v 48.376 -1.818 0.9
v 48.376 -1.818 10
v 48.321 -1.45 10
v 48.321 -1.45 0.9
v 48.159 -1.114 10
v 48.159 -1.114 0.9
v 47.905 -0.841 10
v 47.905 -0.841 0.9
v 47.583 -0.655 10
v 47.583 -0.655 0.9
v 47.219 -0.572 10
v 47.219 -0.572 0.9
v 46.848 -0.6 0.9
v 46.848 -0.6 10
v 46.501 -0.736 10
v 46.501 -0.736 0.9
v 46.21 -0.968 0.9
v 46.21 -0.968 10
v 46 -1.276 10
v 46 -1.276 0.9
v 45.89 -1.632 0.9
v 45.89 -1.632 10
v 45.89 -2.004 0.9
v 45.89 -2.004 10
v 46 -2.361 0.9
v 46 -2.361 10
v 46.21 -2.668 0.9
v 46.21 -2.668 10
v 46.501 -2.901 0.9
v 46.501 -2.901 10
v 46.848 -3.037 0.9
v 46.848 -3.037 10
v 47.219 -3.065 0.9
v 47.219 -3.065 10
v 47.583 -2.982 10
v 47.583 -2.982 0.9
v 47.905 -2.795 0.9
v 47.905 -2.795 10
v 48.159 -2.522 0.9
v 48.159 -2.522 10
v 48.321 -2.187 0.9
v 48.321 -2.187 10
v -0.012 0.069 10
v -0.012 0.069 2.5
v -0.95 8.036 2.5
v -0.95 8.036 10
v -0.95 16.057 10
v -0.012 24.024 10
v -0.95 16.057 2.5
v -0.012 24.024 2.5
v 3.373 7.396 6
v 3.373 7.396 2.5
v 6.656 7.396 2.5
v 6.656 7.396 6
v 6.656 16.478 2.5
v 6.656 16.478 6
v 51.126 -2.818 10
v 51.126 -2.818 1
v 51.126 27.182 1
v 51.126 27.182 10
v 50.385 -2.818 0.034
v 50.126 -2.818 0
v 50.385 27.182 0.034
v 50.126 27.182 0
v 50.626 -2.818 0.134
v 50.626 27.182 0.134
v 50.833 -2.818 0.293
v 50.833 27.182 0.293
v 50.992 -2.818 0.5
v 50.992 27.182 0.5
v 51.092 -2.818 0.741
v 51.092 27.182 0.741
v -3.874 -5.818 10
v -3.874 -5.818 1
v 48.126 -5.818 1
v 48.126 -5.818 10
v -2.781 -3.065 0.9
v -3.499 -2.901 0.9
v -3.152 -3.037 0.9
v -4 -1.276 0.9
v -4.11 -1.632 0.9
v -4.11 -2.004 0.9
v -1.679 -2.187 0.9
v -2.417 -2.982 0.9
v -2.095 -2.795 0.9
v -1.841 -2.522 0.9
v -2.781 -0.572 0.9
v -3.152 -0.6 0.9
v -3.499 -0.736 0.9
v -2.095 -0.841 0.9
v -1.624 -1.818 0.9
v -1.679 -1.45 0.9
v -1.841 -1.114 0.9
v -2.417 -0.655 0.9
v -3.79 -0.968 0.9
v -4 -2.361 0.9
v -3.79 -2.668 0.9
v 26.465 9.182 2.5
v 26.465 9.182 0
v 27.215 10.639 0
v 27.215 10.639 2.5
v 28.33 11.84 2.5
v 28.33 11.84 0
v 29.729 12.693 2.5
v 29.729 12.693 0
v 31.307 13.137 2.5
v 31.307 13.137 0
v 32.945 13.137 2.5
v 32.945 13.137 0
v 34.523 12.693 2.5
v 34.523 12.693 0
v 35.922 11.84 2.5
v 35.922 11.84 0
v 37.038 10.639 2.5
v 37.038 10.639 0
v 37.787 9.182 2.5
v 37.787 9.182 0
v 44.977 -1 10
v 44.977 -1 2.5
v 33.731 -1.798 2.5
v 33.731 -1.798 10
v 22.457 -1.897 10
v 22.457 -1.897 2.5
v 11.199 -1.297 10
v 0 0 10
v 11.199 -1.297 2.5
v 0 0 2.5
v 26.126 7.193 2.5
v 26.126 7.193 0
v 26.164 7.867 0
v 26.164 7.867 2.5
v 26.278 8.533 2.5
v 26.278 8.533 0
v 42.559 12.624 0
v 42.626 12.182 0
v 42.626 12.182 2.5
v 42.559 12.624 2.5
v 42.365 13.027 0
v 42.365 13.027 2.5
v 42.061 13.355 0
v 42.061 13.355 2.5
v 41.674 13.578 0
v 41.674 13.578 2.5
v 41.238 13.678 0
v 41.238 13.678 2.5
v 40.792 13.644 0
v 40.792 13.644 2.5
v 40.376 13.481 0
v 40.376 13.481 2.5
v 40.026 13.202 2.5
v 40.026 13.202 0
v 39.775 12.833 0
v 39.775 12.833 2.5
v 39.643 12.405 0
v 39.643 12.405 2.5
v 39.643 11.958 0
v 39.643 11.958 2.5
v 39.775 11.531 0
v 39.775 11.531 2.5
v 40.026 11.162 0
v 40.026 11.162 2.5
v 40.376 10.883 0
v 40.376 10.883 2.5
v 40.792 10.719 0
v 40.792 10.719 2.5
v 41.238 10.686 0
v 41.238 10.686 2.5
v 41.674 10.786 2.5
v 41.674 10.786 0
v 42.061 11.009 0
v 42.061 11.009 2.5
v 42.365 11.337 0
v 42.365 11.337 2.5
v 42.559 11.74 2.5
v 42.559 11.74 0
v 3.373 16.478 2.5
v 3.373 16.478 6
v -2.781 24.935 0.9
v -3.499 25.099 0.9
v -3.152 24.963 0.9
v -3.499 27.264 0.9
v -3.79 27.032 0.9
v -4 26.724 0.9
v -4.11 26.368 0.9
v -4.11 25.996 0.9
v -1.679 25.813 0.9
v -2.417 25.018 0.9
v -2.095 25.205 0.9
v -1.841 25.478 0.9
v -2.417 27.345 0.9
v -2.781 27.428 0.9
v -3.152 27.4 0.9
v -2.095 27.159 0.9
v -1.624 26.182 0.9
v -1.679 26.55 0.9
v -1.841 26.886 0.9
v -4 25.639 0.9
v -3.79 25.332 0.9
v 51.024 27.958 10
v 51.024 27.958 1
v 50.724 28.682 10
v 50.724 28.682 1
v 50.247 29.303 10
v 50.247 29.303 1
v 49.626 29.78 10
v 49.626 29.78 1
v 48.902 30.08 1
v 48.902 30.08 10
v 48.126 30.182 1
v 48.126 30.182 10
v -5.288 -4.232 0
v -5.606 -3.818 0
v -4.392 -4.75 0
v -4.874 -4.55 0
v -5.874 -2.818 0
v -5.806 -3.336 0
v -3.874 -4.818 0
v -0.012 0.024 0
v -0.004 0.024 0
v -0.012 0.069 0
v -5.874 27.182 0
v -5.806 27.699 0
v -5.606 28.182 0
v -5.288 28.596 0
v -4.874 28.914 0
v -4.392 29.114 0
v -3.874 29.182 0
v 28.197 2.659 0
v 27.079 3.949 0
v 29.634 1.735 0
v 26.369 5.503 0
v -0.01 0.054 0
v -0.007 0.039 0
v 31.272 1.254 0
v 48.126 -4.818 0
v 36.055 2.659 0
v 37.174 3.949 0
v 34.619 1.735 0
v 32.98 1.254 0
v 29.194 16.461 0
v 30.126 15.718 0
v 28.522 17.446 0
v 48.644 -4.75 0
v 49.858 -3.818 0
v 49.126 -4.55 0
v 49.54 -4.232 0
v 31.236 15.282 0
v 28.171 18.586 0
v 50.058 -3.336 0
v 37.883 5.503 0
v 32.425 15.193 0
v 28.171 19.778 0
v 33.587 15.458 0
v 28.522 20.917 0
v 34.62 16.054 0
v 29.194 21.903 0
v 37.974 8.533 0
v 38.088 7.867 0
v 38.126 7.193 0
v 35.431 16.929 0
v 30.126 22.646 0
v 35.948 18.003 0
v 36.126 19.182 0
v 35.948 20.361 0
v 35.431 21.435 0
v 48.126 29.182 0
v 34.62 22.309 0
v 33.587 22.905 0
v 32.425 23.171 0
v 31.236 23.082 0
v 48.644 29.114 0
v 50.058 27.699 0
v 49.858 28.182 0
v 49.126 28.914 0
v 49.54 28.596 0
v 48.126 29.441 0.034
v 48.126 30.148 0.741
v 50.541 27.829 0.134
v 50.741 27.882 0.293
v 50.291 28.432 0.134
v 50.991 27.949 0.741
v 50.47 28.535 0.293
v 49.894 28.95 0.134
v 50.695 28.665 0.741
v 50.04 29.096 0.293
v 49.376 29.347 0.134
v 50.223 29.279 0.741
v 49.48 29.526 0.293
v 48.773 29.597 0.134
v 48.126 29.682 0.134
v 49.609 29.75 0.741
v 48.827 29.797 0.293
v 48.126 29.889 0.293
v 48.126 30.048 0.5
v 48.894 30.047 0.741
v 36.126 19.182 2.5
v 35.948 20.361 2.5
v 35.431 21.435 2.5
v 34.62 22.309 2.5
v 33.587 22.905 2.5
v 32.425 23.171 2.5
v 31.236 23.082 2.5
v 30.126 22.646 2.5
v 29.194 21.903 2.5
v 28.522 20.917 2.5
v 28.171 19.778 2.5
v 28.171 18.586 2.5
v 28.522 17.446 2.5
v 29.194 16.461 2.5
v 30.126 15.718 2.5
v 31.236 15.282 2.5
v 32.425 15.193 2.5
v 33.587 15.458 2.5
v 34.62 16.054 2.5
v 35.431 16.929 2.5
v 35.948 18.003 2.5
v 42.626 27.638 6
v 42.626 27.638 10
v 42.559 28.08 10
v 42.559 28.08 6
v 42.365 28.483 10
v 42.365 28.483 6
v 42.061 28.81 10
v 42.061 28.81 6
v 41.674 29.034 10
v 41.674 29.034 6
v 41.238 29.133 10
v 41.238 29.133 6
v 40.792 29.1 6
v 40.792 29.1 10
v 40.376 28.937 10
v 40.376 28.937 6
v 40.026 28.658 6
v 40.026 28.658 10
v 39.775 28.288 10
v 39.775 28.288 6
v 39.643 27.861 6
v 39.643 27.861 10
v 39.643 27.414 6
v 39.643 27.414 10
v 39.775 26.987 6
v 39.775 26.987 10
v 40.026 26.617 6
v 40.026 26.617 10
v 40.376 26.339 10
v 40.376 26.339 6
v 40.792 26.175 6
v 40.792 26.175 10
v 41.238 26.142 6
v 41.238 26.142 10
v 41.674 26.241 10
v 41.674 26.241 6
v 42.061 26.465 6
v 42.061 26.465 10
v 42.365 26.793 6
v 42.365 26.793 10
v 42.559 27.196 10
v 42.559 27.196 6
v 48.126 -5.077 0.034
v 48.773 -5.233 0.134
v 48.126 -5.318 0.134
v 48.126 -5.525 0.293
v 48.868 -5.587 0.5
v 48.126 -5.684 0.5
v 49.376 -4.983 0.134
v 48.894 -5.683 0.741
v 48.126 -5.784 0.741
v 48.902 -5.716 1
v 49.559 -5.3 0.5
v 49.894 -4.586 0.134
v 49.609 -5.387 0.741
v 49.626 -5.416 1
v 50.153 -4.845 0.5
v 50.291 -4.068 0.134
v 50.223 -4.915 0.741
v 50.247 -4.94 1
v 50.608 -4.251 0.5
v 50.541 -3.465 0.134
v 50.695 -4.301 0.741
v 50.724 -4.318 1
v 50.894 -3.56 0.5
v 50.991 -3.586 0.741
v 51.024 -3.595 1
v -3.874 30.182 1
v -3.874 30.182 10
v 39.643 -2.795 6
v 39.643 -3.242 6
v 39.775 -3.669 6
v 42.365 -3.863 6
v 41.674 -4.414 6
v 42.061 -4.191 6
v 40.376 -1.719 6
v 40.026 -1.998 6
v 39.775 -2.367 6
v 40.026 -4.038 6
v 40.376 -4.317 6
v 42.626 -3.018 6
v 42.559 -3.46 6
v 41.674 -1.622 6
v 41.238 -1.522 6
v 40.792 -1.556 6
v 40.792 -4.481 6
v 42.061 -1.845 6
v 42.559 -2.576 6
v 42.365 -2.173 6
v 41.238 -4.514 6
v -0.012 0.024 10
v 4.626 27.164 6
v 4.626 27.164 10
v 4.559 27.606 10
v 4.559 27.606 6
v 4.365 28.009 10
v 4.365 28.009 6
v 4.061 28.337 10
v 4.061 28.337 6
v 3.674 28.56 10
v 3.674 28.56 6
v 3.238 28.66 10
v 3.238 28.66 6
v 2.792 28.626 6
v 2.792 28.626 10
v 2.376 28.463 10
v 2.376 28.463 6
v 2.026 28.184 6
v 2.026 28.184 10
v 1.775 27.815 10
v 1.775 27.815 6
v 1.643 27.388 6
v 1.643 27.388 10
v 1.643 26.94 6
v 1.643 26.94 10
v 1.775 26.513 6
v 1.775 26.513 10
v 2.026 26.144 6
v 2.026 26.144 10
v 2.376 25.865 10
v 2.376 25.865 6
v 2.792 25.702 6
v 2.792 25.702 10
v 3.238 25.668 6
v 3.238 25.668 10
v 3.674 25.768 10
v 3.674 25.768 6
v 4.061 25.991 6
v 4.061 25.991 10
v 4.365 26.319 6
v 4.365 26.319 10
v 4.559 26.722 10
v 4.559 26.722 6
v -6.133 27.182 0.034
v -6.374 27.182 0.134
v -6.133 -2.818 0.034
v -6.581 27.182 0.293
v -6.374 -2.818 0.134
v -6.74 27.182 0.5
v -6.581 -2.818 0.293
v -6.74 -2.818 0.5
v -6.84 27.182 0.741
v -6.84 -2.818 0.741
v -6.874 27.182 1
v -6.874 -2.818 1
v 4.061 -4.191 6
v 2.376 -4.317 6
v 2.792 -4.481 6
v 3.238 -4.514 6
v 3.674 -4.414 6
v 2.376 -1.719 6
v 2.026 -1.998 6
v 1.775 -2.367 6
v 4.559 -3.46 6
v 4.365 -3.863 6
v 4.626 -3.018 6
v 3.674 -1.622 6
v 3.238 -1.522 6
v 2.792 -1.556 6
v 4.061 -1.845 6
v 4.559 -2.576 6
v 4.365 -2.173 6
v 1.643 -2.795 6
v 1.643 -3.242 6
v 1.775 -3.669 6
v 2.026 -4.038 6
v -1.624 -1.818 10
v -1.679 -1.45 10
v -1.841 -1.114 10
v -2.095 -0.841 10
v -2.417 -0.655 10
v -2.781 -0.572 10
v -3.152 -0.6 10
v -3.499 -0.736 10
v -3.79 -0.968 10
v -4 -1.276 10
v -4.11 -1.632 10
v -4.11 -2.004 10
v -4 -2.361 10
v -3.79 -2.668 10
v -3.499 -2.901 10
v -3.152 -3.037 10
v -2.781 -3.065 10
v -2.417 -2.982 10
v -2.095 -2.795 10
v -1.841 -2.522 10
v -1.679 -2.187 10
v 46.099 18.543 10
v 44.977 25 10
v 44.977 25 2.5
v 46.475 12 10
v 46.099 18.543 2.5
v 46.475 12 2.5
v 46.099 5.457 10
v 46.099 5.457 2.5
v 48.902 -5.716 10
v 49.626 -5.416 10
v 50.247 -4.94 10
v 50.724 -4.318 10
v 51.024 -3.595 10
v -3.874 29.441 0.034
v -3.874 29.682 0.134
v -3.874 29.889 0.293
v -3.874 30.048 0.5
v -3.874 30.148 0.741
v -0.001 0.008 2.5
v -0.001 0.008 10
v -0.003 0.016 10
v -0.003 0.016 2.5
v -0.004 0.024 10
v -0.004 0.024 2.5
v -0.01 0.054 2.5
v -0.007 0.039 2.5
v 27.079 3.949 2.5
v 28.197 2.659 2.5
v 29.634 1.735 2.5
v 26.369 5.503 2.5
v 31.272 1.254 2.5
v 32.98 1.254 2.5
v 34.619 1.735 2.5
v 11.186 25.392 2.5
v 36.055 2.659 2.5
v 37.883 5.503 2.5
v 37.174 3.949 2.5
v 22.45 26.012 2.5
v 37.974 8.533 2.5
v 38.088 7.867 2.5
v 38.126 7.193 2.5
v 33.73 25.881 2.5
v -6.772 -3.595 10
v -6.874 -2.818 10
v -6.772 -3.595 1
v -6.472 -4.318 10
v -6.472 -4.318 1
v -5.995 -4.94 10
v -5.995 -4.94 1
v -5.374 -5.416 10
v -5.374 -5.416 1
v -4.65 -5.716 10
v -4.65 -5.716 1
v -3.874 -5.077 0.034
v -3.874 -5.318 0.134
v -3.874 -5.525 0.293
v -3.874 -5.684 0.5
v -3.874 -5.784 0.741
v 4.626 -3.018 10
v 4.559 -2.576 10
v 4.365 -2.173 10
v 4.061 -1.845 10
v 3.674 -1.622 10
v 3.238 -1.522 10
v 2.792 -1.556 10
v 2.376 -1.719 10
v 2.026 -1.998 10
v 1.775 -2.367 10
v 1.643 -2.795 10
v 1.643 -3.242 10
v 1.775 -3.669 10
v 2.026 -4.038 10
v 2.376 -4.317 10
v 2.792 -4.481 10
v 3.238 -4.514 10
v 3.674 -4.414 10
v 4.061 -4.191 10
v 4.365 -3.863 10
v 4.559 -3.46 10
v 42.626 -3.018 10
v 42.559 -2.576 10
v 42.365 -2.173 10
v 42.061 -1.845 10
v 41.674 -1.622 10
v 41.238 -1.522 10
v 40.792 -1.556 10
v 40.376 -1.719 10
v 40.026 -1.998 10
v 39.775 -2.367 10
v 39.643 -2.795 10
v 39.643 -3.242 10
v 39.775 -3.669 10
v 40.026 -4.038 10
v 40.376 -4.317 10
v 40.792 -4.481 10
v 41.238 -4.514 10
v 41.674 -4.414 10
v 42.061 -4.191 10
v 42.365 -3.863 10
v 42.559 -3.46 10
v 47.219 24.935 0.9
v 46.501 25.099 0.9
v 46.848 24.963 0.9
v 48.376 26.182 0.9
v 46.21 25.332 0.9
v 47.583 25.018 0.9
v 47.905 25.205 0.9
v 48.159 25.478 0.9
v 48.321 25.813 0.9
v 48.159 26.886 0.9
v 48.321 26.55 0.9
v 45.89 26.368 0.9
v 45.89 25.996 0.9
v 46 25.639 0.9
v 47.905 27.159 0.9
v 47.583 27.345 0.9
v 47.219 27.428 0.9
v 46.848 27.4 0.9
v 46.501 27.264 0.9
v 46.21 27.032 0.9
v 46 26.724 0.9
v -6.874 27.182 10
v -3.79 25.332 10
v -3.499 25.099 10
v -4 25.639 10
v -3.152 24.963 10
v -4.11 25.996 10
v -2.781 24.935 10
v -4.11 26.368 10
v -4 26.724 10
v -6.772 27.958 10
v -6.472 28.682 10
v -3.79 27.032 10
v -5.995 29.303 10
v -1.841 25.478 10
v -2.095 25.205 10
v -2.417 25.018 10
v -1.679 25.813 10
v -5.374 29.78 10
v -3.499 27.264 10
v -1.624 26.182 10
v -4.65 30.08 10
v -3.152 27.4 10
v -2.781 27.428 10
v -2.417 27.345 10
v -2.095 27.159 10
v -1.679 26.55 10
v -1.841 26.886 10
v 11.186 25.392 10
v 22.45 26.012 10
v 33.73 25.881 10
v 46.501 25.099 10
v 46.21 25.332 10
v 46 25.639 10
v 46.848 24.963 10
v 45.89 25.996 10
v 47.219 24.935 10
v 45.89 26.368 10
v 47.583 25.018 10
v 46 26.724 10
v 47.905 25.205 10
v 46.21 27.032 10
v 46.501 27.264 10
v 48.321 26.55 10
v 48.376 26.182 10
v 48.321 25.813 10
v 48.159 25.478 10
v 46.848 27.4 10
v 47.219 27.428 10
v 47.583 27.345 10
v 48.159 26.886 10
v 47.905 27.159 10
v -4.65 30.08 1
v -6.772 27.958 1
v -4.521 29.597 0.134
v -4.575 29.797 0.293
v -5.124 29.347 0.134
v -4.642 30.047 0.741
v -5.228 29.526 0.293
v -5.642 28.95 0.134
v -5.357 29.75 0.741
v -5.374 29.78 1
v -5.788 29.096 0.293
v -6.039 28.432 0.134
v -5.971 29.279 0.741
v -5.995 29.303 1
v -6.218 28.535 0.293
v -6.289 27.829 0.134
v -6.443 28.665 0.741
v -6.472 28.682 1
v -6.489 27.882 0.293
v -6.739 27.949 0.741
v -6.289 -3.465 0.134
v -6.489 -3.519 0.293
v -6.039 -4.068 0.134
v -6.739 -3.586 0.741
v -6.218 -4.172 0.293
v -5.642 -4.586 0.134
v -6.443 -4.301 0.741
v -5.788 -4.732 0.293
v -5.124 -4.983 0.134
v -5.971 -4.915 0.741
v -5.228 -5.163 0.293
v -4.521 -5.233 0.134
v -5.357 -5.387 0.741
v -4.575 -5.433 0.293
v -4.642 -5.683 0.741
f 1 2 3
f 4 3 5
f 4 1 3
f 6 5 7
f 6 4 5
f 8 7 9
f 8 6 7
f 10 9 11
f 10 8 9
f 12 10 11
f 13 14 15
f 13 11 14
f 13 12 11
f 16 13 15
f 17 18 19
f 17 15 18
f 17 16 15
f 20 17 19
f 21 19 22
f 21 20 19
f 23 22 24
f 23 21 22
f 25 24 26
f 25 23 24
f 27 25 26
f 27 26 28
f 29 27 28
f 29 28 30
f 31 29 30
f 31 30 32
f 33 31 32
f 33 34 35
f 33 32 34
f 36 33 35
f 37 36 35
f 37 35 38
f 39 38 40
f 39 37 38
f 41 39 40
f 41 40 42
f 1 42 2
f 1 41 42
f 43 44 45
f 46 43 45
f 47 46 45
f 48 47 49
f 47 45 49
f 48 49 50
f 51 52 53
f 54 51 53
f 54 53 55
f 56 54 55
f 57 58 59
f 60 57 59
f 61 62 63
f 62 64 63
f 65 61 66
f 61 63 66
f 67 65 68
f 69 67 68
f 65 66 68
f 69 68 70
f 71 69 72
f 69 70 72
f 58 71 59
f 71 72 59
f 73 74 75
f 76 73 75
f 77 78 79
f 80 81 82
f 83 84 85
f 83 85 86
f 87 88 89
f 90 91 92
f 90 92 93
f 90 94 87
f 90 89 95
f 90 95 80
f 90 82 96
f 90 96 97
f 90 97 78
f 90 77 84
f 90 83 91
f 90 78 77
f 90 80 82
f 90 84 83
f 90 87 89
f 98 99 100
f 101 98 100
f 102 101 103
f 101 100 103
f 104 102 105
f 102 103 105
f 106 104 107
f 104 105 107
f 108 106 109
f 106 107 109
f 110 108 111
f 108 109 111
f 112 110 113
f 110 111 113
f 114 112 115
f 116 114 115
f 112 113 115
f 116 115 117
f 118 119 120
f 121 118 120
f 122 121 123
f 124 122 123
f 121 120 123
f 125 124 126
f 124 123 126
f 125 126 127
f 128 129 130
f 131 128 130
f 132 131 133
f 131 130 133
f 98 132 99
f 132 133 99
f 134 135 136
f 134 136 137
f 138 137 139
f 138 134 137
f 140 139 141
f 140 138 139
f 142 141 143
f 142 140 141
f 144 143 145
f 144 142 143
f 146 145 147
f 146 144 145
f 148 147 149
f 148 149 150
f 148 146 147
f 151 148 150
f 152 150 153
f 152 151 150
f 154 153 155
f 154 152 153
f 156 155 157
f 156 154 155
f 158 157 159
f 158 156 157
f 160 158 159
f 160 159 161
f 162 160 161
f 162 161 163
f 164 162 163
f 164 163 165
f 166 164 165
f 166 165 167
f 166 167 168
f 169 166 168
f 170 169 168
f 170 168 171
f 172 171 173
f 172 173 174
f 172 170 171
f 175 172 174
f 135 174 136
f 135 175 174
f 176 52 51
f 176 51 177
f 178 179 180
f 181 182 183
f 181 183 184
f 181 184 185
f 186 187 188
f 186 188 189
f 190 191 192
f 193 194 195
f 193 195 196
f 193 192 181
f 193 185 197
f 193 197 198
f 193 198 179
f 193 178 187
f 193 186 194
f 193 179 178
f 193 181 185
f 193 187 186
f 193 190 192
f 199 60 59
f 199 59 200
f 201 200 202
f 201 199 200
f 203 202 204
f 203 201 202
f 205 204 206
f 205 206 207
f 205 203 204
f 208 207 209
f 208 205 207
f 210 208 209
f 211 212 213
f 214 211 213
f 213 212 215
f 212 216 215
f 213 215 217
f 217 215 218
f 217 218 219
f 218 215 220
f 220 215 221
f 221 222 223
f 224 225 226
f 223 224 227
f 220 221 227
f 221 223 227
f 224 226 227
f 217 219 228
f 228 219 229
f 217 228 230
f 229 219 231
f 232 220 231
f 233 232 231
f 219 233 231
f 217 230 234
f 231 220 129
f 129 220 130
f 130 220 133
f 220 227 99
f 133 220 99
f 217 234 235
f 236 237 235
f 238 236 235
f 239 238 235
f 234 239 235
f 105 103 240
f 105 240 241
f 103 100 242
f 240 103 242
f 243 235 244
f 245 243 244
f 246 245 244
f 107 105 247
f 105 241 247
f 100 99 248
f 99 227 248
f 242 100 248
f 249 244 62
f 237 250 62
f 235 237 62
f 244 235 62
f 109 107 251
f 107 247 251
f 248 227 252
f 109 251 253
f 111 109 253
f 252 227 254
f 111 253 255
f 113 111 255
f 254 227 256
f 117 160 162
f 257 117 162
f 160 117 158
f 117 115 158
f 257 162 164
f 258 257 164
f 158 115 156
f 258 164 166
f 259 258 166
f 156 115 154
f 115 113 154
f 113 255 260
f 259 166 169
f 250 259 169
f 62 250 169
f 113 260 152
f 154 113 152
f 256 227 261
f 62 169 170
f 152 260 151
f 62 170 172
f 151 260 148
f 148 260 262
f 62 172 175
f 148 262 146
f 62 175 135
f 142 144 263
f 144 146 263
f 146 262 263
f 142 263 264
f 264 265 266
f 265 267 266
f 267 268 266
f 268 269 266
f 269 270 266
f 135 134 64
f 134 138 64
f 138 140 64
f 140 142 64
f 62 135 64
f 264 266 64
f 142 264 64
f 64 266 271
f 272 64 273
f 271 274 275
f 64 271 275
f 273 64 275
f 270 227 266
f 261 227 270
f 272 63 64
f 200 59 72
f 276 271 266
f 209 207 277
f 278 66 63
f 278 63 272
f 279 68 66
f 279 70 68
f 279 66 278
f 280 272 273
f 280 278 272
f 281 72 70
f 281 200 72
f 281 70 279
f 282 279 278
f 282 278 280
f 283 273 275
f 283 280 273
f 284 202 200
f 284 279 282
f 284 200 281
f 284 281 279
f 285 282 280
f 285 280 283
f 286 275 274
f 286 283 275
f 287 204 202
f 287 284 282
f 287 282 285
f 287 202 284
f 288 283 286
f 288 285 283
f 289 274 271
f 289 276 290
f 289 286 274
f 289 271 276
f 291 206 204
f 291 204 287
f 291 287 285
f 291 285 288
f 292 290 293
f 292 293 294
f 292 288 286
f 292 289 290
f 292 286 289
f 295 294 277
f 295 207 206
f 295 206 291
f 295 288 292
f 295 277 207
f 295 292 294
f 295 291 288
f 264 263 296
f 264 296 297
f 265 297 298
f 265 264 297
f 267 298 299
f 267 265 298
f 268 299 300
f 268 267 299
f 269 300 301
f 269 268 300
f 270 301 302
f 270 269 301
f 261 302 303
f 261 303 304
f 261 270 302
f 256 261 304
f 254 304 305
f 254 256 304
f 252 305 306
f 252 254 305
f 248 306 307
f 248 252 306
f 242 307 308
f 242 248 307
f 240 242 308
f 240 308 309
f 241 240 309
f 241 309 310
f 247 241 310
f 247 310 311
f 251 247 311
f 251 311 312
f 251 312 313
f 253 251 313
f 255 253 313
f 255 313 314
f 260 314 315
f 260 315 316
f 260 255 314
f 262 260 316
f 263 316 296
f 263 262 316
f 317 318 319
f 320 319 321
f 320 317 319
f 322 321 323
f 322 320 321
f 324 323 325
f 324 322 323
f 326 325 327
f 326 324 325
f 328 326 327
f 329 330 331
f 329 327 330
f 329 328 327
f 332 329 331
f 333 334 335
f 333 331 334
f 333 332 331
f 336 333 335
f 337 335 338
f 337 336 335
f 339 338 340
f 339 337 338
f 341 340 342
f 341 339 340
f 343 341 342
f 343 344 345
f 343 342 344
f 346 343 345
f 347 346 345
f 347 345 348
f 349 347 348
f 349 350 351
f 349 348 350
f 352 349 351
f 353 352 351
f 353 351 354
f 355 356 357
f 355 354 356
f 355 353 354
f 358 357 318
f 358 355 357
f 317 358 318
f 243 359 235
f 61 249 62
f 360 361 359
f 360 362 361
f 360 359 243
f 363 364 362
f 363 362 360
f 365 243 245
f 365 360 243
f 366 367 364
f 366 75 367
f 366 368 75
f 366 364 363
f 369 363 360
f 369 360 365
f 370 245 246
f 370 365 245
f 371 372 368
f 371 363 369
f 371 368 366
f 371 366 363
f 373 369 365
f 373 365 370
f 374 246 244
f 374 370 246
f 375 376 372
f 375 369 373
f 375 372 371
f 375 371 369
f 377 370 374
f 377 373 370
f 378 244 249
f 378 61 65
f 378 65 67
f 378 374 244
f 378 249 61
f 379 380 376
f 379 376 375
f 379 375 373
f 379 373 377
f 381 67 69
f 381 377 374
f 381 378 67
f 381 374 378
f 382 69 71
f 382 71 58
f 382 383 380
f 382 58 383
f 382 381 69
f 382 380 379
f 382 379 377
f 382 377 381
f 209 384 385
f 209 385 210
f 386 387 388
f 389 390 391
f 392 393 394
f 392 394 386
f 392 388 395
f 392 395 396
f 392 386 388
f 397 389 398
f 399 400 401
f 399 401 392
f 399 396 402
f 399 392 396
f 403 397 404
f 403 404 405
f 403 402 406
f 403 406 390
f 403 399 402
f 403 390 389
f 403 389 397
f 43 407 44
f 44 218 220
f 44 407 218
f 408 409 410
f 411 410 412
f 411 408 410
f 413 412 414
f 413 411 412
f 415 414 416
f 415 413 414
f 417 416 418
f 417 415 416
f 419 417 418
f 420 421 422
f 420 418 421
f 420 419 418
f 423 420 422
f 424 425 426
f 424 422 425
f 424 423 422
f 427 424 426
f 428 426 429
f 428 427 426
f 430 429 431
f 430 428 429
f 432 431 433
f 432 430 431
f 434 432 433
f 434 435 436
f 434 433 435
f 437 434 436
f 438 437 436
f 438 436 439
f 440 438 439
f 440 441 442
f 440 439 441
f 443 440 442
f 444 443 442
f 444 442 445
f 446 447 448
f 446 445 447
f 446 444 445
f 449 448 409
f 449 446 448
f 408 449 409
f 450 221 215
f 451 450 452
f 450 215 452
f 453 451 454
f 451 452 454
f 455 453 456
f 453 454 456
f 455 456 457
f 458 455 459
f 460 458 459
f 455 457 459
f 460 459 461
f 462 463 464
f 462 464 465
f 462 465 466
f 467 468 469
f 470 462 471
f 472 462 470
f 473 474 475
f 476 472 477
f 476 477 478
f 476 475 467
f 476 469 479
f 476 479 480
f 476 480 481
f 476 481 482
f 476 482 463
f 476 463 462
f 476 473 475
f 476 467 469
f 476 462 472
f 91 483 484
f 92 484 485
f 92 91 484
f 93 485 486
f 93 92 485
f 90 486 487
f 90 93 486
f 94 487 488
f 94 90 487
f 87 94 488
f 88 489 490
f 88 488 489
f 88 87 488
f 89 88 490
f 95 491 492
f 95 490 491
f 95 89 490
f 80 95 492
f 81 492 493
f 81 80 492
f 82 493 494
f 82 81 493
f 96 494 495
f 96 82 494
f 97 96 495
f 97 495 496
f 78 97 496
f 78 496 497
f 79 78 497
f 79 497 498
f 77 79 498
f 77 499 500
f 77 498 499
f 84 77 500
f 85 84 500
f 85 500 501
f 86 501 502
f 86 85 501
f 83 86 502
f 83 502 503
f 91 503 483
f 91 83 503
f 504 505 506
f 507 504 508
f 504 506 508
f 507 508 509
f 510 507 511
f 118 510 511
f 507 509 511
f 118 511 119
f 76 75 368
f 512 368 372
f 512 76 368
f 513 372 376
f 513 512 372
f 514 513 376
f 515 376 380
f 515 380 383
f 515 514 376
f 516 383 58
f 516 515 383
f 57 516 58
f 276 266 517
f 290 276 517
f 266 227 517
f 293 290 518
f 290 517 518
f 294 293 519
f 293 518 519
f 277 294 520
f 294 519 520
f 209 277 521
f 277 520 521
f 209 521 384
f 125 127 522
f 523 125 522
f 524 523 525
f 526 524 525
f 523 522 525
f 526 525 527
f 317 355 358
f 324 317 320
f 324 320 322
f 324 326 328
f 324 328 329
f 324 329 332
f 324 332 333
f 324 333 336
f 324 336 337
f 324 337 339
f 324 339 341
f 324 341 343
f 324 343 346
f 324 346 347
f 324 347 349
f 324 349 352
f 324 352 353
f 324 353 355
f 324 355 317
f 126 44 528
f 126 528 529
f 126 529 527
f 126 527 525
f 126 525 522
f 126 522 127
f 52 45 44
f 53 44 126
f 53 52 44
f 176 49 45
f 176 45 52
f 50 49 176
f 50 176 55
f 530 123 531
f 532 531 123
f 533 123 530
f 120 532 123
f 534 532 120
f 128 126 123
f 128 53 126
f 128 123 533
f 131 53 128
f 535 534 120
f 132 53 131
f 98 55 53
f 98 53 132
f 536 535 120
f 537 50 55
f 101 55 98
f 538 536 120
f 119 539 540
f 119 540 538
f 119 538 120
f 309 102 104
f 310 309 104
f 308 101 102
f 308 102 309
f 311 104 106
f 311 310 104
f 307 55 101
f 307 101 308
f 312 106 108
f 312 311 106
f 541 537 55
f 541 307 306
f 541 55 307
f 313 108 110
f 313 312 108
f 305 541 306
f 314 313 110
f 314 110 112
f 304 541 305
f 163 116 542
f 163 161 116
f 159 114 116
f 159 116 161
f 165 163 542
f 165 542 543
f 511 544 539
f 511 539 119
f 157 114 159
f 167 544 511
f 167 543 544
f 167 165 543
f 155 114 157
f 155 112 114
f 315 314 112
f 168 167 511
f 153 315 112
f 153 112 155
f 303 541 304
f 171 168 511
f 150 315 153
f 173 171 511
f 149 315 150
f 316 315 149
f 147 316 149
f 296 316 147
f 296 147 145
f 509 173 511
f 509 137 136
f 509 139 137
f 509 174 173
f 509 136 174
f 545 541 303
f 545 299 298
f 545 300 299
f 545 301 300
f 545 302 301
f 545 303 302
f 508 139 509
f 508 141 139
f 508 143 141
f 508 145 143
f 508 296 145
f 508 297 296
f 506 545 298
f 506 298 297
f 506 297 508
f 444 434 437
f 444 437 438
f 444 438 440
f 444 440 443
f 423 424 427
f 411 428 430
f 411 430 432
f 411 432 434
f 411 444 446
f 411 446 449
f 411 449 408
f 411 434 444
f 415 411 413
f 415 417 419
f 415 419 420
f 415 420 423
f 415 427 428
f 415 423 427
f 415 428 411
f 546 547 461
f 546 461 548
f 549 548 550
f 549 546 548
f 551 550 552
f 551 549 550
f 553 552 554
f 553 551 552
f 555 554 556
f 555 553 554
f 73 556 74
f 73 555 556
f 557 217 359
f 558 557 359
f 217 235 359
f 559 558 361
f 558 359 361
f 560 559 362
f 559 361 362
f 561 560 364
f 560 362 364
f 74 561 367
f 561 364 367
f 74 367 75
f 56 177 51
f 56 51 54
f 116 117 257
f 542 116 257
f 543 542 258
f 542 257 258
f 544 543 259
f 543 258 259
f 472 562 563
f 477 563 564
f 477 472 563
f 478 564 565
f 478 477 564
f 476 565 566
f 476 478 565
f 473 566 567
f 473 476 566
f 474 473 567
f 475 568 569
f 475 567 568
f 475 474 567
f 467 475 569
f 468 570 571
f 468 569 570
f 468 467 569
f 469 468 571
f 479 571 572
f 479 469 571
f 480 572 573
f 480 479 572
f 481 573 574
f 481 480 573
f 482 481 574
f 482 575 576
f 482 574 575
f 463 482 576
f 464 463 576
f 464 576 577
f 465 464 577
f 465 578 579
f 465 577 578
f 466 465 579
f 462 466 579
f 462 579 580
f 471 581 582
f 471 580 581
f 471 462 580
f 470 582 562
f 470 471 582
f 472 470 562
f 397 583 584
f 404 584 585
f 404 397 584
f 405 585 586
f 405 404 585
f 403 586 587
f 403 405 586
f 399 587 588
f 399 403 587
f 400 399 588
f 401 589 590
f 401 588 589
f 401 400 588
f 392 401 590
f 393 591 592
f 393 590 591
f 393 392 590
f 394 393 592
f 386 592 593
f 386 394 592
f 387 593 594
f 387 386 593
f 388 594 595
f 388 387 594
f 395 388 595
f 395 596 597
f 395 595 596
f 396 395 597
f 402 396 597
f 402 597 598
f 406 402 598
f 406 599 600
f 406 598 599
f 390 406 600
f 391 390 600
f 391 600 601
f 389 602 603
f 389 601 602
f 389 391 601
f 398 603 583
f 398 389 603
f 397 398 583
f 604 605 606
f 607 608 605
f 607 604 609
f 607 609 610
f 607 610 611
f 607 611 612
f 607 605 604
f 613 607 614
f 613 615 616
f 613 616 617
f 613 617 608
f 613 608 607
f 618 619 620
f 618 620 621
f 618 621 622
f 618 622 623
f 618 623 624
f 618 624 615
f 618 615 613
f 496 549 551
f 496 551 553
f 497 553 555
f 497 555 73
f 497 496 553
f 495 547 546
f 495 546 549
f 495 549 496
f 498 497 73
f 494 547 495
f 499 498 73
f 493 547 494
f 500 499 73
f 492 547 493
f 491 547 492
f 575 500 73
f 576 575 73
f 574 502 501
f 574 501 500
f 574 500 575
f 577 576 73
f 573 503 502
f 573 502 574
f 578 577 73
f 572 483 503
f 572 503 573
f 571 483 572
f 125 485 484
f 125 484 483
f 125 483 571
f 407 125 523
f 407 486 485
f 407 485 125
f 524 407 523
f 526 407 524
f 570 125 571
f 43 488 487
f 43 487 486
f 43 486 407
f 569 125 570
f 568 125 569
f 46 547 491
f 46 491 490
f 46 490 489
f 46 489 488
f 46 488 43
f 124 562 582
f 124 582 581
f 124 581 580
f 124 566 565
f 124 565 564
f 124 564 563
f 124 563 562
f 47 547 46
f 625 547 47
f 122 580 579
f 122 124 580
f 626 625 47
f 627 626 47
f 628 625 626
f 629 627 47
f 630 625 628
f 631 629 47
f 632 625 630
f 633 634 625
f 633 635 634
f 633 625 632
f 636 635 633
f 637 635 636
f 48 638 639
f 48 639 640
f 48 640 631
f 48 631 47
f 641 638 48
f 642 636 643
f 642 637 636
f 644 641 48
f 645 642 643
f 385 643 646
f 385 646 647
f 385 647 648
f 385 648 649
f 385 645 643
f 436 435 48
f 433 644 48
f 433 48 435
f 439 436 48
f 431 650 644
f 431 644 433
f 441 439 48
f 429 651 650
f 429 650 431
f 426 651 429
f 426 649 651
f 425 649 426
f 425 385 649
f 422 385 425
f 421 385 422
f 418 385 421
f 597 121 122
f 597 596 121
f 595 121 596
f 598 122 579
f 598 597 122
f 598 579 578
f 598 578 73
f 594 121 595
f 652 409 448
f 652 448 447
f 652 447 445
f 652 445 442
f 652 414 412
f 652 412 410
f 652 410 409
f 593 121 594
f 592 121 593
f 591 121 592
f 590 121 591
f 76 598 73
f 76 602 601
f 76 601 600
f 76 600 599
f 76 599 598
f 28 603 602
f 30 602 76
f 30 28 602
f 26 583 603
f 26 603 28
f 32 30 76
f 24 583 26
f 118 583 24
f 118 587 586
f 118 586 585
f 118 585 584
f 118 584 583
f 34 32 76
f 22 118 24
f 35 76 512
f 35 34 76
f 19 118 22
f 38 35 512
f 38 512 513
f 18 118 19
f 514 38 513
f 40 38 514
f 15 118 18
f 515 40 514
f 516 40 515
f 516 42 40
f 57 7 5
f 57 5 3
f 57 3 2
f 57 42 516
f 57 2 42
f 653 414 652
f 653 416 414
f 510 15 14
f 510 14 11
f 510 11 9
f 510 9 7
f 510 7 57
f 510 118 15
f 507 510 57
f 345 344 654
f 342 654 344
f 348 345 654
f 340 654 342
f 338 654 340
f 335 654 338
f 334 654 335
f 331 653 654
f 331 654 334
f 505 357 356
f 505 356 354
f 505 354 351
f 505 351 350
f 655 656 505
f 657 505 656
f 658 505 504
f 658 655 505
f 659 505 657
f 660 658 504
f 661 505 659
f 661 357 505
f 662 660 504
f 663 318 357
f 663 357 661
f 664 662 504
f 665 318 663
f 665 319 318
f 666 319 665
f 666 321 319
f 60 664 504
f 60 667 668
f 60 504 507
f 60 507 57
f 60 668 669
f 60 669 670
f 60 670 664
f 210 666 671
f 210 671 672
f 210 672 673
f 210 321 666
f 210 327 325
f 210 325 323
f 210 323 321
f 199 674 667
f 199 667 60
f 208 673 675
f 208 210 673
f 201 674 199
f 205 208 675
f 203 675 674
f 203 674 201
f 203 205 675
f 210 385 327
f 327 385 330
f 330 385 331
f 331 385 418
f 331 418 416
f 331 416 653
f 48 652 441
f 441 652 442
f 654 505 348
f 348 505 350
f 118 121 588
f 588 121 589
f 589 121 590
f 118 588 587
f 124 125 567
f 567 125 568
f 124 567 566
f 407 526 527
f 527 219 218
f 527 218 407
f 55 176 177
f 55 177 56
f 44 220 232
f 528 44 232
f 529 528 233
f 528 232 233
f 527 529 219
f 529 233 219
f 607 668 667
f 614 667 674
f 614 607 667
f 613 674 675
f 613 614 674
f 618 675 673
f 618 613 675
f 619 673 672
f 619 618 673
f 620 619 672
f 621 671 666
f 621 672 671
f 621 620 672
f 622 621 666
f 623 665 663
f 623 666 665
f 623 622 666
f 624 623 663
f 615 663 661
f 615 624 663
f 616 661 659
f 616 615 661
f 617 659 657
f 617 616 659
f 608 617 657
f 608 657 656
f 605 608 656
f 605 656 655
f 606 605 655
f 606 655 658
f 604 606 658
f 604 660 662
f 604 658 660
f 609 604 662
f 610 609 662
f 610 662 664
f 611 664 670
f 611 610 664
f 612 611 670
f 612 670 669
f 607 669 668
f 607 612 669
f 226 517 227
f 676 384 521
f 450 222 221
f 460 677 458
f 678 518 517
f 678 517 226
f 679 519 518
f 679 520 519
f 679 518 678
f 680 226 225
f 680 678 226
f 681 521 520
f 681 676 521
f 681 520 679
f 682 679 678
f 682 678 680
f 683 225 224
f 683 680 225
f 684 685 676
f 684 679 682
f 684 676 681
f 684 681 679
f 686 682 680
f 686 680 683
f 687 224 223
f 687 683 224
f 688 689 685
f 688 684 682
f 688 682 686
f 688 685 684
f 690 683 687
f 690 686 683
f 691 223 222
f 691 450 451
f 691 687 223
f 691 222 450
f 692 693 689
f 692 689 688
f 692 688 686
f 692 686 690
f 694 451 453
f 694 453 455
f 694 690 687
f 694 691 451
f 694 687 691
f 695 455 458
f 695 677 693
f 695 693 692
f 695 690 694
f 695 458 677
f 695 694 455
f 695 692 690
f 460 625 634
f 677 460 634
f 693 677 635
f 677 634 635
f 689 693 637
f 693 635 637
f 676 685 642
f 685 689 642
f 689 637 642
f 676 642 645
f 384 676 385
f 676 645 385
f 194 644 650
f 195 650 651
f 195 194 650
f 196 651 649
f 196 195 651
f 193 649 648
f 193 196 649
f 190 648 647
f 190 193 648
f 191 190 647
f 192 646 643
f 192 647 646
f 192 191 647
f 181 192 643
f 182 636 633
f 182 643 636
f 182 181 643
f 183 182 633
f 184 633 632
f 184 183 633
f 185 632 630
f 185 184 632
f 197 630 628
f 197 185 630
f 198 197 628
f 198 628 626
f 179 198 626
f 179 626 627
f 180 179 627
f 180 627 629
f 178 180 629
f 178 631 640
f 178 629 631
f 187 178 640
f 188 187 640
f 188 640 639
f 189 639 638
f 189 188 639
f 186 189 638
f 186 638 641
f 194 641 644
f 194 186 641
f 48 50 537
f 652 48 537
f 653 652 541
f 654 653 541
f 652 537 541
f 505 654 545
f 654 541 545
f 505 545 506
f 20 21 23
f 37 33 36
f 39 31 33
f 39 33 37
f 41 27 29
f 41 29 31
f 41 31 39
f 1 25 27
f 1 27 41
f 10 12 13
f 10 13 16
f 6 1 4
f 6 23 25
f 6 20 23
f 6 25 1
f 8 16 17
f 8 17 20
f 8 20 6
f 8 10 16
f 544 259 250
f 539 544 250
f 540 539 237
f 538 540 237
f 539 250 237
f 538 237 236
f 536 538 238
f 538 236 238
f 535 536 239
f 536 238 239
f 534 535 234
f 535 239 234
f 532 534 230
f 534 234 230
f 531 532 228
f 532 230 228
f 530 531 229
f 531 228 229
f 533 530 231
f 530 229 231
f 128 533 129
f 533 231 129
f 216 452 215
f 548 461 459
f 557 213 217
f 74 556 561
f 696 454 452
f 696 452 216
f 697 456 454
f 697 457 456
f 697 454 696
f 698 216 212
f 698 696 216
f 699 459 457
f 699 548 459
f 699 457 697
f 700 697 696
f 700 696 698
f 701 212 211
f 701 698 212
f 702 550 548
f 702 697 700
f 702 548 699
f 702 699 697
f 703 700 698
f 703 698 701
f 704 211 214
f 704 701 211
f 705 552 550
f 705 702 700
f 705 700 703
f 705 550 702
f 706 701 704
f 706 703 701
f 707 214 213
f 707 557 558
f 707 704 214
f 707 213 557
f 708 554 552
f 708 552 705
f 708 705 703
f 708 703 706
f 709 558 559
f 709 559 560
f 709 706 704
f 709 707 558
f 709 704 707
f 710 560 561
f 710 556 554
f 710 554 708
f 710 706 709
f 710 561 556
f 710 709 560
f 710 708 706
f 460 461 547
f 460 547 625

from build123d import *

# Parameters (mm, degrees)
F0_W     = 58
F0_H     = 36
F0_R     = 1.25
F0_R_2   = 1.5
F1_DEPTH = 10
F0_R_3   = 1
F0_W_2   = 3.2825097442
F0_H_2   = 9.0816104785
F0_R_4   = 4
F2_DEPTH = 2.5
F3_R     = 3
F4_DEPTH = 6
F5_START = 0.9
F5_DEPTH = 16.2
F6_START = 6
F6_DEPTH = 10.7
F7_R     = 1


with BuildPart() as f1:
    # F0 (on Top) → F1 (new body)
    with BuildSketch(Plane.XY):
        with Locations((22.1260370687, 12.181818096)):
            Rectangle(F0_W, F0_H)
        with Locations((-2.8739629313, -1.818181904)):
            Circle(F0_R, mode=Mode.SUBTRACT)
        with Locations((3.1260370687, -3.018181904)):
            Circle(F0_R_2, mode=Mode.SUBTRACT)
        with Locations((41.1260370687, -3.018181904)):
            Circle(F0_R_2, mode=Mode.SUBTRACT)
        with Locations((47.1260370687, -1.818181904)):
            Circle(F0_R, mode=Mode.SUBTRACT)
        with BuildLine():
            Line((-0.0042433119, 0.0237876128), (-0.0123524841, 0.02397218))
            Line((-0.0123524841, 0.02397218), (-0.0123524841, 0.0693824727))
            ThreePointArc((-0.0123524841, 0.0693824727), (-1.0671188126, 12.0466773263), (-0.0123524841, 24.02397218))
            ThreePointArc((-0.0123524841, 24.02397218), (22.4498159336, 26.0118318189), (44.9770614896, 25))
            ThreePointArc((44.9770614896, 25), (46.474513746, 12), (44.9770614896, -1))
            ThreePointArc((44.9770614896, -1), (22.4574664967, -1.8971785964), (0, 0))
            ThreePointArc((0, 0), (-0.0021227043, 0.0118936194), (-0.0042433119, 0.0237876128))
        make_face(mode=Mode.SUBTRACT)
        with Locations((-2.8739629313, 26.181818096)):
            Circle(F0_R, mode=Mode.SUBTRACT)
        with Locations((3.1260370687, 27.16396598)):
            Circle(F0_R_2, mode=Mode.SUBTRACT)
        with Locations((41.1260370687, 27.6376707083)):
            Circle(F0_R_2, mode=Mode.SUBTRACT)
        with Locations((47.1260370687, 26.181818096)):
            Circle(F0_R, mode=Mode.SUBTRACT)
        with Locations((-2.8739629313, 26.181818096)):
            Circle(F0_R)
        with Locations((47.1260370687, 26.181818096)):
            Circle(F0_R)
        with Locations((47.1260370687, -1.818181904)):
            Circle(F0_R)
        with Locations((-2.8739629313, -1.818181904)):
            Circle(F0_R)
        with Locations((3.1260370687, -3.018181904)):
            Circle(F0_R_2)
        with Locations((3.1260370687, 27.16396598)):
            Circle(F0_R_2)
        with Locations((41.1260370687, 27.6376707083)):
            Circle(F0_R_2)
        with Locations((41.1260370687, -3.018181904)):
            Circle(F0_R_2)
    extrude(amount=F1_DEPTH)

    # F0 (on Top) → F2 (join)
    with BuildSketch(Plane.XY):
        with BuildLine():
            ThreePointArc((-0.0123524841, 24.02397218), (-1.0671188126, 12.0466773263), (-0.0123524841, 0.0693824727))
            Line((-0.0123524841, 0.0693824727), (-0.0123524841, 24.02397218))
        make_face()
        with BuildLine():
            Line((-0.0123524841, 24.02397218), (-0.0123524841, 0.0693824727))
            ThreePointArc((-0.0123524841, 0.0693824727), (-0.0083017494, 0.0465843578), (-0.0042433119, 0.0237876128))
            Line((-0.0042433119, 0.0237876128), (44.9770614896, -1))
            Line((44.9770614896, -1), (44.9770614896, 25))
            Line((44.9770614896, 25), (-0.0123524841, 24.02397218))
        make_face()
        with Locations((2.9621722015, 2.0848012064)):
            Circle(F0_R_3, mode=Mode.SUBTRACT)
        with Locations((5.0146379508, 11.9371688925)):
            Rectangle(F0_W_2, F0_H_2, mode=Mode.SUBTRACT)
        with Locations((41.7125664489, 2.0848012064)):
            Circle(F0_R_3, mode=Mode.SUBTRACT)
        with BuildLine():
            Line((26.1260370687, 7.1930042468), (26.1260370687, 9.181818096))
            Line((26.1260370687, 9.181818096), (26.4652403515, 9.181818096))
            ThreePointArc((26.4652403515, 9.181818096), (32.1260370687, 13.1930042468), (37.7868337859, 9.181818096))
            Line((37.7868337859, 9.181818096), (38.1260370687, 9.181818096))
            Line((38.1260370687, 9.181818096), (38.1260370687, 7.1930042468))
            Line((38.1260370687, 7.1930042468), (38.1260370687, 1.181818096))
            Line((38.1260370687, 1.181818096), (26.1260370687, 1.181818096))
            Line((26.1260370687, 1.181818096), (26.1260370687, 7.1930042468))
        make_face(mode=Mode.SUBTRACT)
        with Locations((41.1260370687, 12.181818096)):
            Circle(F0_R_2, mode=Mode.SUBTRACT)
        with Locations((18.8074270263, 12.2937392443)):
            Circle(F0_R_3, mode=Mode.SUBTRACT)
        with Locations((2.9621722015, 21.6664075851)):
            Circle(F0_R_3, mode=Mode.SUBTRACT)
        with Locations((26.8074270263, 12.2937392443)):
            Circle(F0_R_3, mode=Mode.SUBTRACT)
        with Locations((32.1260370687, 19.181818096)):
            Circle(F0_R_4, mode=Mode.SUBTRACT)
        with Locations((41.7125664489, 21.6664075851)):
            Circle(F0_R_3, mode=Mode.SUBTRACT)
        with BuildLine():
            Line((44.9770614896, -1), (-0.0042433119, 0.0237876128))
            ThreePointArc((-0.0042433119, 0.0237876128), (-0.0021227043, 0.0118936194), (0, 0))
            ThreePointArc((0, 0), (22.4574664967, -1.8971785964), (44.9770614896, -1))
        make_face()
        with BuildLine():
            ThreePointArc((44.9770614896, 25), (22.4498159336, 26.0118318189), (-0.0123524841, 24.02397218))
            Line((-0.0123524841, 24.02397218), (44.9770614896, 25))
        make_face()
        with BuildLine():
            Line((44.9770614896, 25), (44.9770614896, -1))
            ThreePointArc((44.9770614896, -1), (46.474513746, 12), (44.9770614896, 25))
        make_face()
        with Locations((2.9621722015, 21.6664075851)):
            Circle(F0_R_3)
        with Locations((2.9621722015, 2.0848012064)):
            Circle(F0_R_3)
        with Locations((41.7125664489, 2.0848012064)):
            Circle(F0_R_3)
        with Locations((41.7125664489, 21.6664075851)):
            Circle(F0_R_3)
        with Locations((18.8074270263, 12.2937392443)):
            Circle(F0_R_3)
        with Locations((26.8074270263, 12.2937392443)):
            Circle(F0_R_3)
        with Locations((5.0146379508, 11.9371688925)):
            Rectangle(F0_W_2, F0_H_2)
        with BuildLine():
            Line((26.4652403515, 9.181818096), (26.1260370687, 9.181818096))
            Line((26.1260370687, 9.181818096), (26.1260370687, 7.1930042468))
            ThreePointArc((26.1260370687, 7.1930042468), (26.2114457767, 8.2017707453), (26.4652403515, 9.181818096))
        make_face()
        with BuildLine():
            ThreePointArc((38.1260370687, 7.1930042468), (32.1260370687, 1.1930042468), (26.1260370687, 7.1930042468))
            Line((26.1260370687, 7.1930042468), (26.1260370687, 1.181818096))
            Line((26.1260370687, 1.181818096), (38.1260370687, 1.181818096))
            Line((38.1260370687, 1.181818096), (38.1260370687, 7.1930042468))
        make_face()
        with BuildLine():
            Line((38.1260370687, 9.181818096), (37.7868337859, 9.181818096))
            ThreePointArc((37.7868337859, 9.181818096), (38.0406283607, 8.2017707453), (38.1260370687, 7.1930042468))
            Line((38.1260370687, 7.1930042468), (38.1260370687, 9.181818096))
        make_face()
    extrude(amount=F2_DEPTH)

    # F3
    f3_edges = [f1.edges().sort_by_distance(p)[0] for p in [
        (51.126037, 30.181818, 5),
        (51.126037, -5.818182, 5),
        (-6.873963, -5.818182, 5),
        (-6.873963, 30.181818, 5),
    ]]
    fillet(f3_edges, radius=F3_R)

    # F0 (on Top) → F4 (join)
    with BuildSketch(Plane.XY):
        with Locations((5.0146379508, 11.9371688925)):
            Rectangle(F0_W_2, F0_H_2)
    extrude(amount=F4_DEPTH)

    # F0 (on Top) → F5 (cut)
    with BuildSketch(Plane.XY.offset(F5_START)):
        with Locations((47.1260370687, 26.181818096)):
            Circle(F0_R)
        with Locations((-2.8739629313, 26.181818096)):
            Circle(F0_R)
        with Locations((-2.8739629313, -1.818181904)):
            Circle(F0_R)
        with Locations((47.1260370687, -1.818181904)):
            Circle(F0_R)
    extrude(amount=F5_DEPTH, mode=Mode.SUBTRACT)

    # F0 (on Top) → F6 (cut)
    with BuildSketch(Plane.XY.offset(F6_START)):
        with Locations((3.1260370687, 27.16396598)):
            Circle(F0_R_2)
        with Locations((41.1260370687, 27.6376707083)):
            Circle(F0_R_2)
        with Locations((41.1260370687, -3.018181904)):
            Circle(F0_R_2)
        with Locations((3.1260370687, -3.018181904)):
            Circle(F0_R_2)
    extrude(amount=F6_DEPTH, mode=Mode.SUBTRACT)

    # F7
    f7_edges = [f1.edges().sort_by_distance(p)[0] for p in [
        (51.126037, 12.181818, 0),
        (22.126037, -5.818182, 0),
        (50.247357, -4.939502, 0),
        (50.247357, 29.303138, 0),
        (22.126037, 30.181818, 0),
        (-5.995283, 29.303138, 0),
        (-6.873963, 12.181818, 0),
        (-5.995283, -4.939502, 0),
    ]]
    fillet(f7_edges, radius=F7_R)


solid = f1.part
